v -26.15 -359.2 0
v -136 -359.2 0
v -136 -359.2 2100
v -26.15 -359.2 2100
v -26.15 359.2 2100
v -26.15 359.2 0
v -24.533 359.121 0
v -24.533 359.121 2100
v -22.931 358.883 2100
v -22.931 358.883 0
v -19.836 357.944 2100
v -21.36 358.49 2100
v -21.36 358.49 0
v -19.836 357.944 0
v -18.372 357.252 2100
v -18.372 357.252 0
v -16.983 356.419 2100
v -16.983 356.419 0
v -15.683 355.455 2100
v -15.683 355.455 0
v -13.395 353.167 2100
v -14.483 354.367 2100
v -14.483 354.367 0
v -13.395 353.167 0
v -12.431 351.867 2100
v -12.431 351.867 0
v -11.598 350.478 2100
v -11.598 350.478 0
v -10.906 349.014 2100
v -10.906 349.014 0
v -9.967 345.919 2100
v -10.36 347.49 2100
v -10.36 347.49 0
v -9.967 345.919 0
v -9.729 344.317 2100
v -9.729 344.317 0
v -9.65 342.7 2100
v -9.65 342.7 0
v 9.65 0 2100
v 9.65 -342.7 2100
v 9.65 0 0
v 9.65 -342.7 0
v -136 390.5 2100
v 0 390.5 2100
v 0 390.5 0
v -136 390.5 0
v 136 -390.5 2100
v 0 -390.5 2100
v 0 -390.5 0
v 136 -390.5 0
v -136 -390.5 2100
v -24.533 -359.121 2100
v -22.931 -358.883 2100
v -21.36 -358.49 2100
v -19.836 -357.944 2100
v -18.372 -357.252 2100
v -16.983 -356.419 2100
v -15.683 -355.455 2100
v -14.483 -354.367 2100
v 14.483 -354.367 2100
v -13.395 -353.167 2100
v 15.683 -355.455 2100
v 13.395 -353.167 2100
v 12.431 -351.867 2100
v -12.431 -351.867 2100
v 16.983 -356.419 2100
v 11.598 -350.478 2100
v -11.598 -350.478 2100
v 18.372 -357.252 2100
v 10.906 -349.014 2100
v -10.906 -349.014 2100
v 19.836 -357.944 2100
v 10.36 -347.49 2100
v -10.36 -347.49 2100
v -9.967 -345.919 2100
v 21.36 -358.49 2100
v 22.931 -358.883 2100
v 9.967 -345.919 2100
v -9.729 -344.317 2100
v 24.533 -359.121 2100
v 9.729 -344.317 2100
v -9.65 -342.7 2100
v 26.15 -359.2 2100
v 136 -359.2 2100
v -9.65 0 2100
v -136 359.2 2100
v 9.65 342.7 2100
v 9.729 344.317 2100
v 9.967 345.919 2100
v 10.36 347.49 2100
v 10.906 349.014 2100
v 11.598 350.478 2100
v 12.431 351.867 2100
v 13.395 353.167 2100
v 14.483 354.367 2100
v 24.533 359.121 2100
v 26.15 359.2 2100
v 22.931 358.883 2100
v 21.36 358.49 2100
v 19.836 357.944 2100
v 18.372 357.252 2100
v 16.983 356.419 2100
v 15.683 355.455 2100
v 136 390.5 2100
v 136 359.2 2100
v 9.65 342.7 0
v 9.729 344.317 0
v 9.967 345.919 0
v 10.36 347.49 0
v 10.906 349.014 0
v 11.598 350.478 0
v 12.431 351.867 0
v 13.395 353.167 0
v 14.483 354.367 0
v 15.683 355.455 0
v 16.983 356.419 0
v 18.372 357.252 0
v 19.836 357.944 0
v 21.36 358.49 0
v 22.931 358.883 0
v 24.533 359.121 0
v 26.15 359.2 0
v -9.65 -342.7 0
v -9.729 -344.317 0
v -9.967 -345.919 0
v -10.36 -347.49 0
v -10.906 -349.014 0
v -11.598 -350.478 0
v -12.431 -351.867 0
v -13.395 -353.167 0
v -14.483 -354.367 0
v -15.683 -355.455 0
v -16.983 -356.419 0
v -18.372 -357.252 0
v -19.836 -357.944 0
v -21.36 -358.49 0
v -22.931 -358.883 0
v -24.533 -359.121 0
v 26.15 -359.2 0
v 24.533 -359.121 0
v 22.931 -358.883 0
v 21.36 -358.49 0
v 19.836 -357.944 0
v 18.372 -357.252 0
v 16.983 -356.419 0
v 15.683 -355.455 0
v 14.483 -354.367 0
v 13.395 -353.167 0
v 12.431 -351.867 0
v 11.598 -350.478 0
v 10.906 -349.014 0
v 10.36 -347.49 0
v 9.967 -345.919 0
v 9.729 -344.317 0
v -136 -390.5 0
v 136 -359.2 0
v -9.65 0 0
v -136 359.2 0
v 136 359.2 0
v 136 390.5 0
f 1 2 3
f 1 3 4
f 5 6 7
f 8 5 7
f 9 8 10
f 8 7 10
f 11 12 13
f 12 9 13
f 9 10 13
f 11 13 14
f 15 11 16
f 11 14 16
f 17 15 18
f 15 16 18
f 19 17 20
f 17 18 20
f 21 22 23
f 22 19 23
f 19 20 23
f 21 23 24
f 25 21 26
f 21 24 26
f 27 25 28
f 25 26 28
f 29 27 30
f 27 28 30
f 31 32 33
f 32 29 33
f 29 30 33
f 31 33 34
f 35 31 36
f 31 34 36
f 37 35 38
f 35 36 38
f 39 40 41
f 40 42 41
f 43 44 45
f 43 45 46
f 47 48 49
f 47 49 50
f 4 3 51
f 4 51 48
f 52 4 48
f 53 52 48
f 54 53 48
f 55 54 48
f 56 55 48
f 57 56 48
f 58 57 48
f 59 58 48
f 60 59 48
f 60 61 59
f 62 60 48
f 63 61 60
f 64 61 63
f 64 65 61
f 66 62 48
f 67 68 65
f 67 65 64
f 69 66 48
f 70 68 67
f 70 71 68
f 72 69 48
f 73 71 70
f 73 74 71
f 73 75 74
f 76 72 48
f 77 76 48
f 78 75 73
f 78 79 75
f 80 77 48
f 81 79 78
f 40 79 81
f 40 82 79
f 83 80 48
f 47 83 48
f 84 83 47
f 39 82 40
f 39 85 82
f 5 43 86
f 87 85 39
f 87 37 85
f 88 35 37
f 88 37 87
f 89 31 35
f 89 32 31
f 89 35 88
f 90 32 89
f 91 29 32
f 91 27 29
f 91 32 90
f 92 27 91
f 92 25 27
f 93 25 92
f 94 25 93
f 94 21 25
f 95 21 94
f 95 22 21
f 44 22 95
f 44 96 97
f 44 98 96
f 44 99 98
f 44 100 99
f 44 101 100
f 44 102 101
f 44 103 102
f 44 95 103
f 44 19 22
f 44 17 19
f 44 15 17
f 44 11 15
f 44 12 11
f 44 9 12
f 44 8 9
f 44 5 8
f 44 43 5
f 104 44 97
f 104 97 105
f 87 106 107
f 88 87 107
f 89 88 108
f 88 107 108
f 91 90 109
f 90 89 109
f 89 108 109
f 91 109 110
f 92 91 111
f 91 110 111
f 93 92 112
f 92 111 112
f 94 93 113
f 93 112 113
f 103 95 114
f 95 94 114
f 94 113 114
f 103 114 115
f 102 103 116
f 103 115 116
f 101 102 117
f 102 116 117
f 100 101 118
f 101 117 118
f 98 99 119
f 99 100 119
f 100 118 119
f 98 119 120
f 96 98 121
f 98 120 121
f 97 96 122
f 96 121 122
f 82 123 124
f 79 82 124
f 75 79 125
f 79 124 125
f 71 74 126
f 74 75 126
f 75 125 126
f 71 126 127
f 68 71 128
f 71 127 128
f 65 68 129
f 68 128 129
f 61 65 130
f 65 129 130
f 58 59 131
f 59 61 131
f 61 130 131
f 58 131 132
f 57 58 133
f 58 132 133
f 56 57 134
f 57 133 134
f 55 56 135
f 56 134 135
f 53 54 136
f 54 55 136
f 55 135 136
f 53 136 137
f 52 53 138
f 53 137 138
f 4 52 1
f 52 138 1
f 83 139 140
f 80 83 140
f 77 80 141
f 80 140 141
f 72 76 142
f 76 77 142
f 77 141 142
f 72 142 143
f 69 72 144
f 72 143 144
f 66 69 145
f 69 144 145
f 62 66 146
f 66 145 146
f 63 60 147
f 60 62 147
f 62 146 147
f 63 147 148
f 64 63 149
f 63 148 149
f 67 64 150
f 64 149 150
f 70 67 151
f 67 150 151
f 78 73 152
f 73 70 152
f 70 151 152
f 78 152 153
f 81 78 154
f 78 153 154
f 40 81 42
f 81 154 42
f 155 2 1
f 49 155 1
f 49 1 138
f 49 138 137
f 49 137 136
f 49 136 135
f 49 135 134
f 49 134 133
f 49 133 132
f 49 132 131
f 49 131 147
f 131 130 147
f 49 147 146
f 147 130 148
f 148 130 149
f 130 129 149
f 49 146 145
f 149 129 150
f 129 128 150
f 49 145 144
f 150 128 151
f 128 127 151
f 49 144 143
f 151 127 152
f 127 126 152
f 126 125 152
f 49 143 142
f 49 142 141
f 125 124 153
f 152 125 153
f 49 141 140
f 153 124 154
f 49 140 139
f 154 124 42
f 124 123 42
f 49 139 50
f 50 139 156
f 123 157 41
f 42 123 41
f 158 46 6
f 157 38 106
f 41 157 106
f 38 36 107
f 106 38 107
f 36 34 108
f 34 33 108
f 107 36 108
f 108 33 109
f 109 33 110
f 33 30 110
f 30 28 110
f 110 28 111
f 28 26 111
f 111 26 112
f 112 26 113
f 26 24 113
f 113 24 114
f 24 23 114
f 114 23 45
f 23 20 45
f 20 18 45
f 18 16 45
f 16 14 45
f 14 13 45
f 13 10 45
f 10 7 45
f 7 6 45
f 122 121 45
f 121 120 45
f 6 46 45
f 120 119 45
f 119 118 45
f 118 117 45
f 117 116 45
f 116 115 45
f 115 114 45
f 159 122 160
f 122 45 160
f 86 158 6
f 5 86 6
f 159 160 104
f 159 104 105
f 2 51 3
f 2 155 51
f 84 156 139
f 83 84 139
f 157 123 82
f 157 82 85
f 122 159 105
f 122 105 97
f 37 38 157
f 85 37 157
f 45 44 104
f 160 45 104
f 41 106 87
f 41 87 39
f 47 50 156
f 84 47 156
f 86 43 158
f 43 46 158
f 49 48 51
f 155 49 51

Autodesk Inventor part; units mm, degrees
ref_plane "YZ Plane" through (0, 0, 0) normal (1, 0, 0) x (0, 1, 0)
ref_plane "Start plane" through (0, 0, 0) normal (0, 0, 1) x (1, 0, 0)
ref_plane "End plane" through (0, 0, 2100) normal (0, 0, 1) x (1, 0, 0)
sketch "Sketch" plane through (0, 0, 0) normal (0, 0, 1) x (1, 0, 0)
  line L0 (-136, -390.5) -> (-136, -359.2)
  line L1 (-136, -359.2) -> (-26.15, -359.2)
  line L2 (-9.65, -342.7) -> (-9.65, 0)
  line L3 (-9.65, 0) -> (0, 0) construction
  line L4 (0, 0) -> (0, -390.5) construction
  line L5 (0, -390.5) -> (-136, -390.5)
  line L6 (-60, 0) -> (80, 0) construction
  line L7 (0, -60) -> (0, 80) construction
  line L8 (136, -390.5) -> (136, -359.2)
  line L9 (136, -359.2) -> (26.15, -359.2)
  line L10 (9.65, -342.7) -> (9.65, 0)
  line L11 (9.65, 0) -> (0, 0) construction
  line L12 (0, -390.5) -> (136, -390.5)
  line L13 (-136, 390.5) -> (-136, 359.2)
  line L14 (-136, 359.2) -> (-26.15, 359.2)
  line L15 (-9.65, 342.7) -> (-9.65, 0)
  line L16 (0, 390.5) -> (-136, 390.5)
  line L17 (136, 390.5) -> (136, 359.2)
  line L18 (136, 359.2) -> (26.15, 359.2)
  line L19 (0, 390.5) -> (136, 390.5)
  line L20 (9.65, 342.7) -> (9.65, 0)
  arc A0 (-9.65, 342.7) -> (-26.15, 359.2) centre (-26.15, 342.7) ccw
  arc A1 (26.15, 359.2) -> (9.65, 342.7) centre (26.15, 342.7) ccw
  arc A2 (9.65, -342.7) -> (26.15, -359.2) centre (26.15, -342.7) ccw
  arc A3 (-26.15, -359.2) -> (-9.65, -342.7) centre (-26.15, -342.7) ccw
  line L21 (0, 108) -> (0, -88) construction
  line L22 (-88, 0) -> (108, 0) construction
  point P0 (-9.65, -359.2)
  point P1 (9.65, -359.2)
  point P2 (-9.65, 359.2)
  point P3 (9.65, 359.2)
  dimension "d1" = 390.5
  dimension "d2" = 31.3
  dimension "d3" = 136
  dimension "d4" = 9.65
  dimension "d10" = 16.5
extrude "Body" add sketch "Sketch" along normal up to surface (2100 mm away) from surface at 0
sketch "Sketch4" plane through (0, 0, 0) normal (0, 0, 1) x (1, 0, 0)
  line L0 (0, 0) -> (10, 0)
ref_plane "Work Plane3" through (0, 0, 0) normal (0, -1, 0) x (1, 0, 0)
sketch "Sketch5" plane through (0, 0, 0) normal (0, -1, 0) x (1, 0, 0)
  line L0 (-2, 0) -> (12, 0) projected
  line L1 (-2, 2100) -> (12, 2100) projected
  dimension "d14" = 2100
equation "\"d1\" = 0.5 * G_H"
equation "\"d2\" = G_T1"
equation "\"d3\" = 0.5 * G_W"
equation "\"d4\" = 0.5 * G_T"
equation "\"d10\" = G_IR"
equation "\"d5\" = G_L"
equation "\"G_W\" = 272"
equation "\"G_H\" = 781"
equation "\"G_T\" = 19.3"
equation "\"G_T1\" = 31.3"
equation "\"G_IR\" = 16.5"
equation "\"G_L\" = d14"
equation "\"G_OFFSET_START\" = 0"
equation "\"G_OFFSET_END\" = 0"
properties part number "AS 3679-1990 - 760 UB - 244 - 2100" material "Steel, Mild"
